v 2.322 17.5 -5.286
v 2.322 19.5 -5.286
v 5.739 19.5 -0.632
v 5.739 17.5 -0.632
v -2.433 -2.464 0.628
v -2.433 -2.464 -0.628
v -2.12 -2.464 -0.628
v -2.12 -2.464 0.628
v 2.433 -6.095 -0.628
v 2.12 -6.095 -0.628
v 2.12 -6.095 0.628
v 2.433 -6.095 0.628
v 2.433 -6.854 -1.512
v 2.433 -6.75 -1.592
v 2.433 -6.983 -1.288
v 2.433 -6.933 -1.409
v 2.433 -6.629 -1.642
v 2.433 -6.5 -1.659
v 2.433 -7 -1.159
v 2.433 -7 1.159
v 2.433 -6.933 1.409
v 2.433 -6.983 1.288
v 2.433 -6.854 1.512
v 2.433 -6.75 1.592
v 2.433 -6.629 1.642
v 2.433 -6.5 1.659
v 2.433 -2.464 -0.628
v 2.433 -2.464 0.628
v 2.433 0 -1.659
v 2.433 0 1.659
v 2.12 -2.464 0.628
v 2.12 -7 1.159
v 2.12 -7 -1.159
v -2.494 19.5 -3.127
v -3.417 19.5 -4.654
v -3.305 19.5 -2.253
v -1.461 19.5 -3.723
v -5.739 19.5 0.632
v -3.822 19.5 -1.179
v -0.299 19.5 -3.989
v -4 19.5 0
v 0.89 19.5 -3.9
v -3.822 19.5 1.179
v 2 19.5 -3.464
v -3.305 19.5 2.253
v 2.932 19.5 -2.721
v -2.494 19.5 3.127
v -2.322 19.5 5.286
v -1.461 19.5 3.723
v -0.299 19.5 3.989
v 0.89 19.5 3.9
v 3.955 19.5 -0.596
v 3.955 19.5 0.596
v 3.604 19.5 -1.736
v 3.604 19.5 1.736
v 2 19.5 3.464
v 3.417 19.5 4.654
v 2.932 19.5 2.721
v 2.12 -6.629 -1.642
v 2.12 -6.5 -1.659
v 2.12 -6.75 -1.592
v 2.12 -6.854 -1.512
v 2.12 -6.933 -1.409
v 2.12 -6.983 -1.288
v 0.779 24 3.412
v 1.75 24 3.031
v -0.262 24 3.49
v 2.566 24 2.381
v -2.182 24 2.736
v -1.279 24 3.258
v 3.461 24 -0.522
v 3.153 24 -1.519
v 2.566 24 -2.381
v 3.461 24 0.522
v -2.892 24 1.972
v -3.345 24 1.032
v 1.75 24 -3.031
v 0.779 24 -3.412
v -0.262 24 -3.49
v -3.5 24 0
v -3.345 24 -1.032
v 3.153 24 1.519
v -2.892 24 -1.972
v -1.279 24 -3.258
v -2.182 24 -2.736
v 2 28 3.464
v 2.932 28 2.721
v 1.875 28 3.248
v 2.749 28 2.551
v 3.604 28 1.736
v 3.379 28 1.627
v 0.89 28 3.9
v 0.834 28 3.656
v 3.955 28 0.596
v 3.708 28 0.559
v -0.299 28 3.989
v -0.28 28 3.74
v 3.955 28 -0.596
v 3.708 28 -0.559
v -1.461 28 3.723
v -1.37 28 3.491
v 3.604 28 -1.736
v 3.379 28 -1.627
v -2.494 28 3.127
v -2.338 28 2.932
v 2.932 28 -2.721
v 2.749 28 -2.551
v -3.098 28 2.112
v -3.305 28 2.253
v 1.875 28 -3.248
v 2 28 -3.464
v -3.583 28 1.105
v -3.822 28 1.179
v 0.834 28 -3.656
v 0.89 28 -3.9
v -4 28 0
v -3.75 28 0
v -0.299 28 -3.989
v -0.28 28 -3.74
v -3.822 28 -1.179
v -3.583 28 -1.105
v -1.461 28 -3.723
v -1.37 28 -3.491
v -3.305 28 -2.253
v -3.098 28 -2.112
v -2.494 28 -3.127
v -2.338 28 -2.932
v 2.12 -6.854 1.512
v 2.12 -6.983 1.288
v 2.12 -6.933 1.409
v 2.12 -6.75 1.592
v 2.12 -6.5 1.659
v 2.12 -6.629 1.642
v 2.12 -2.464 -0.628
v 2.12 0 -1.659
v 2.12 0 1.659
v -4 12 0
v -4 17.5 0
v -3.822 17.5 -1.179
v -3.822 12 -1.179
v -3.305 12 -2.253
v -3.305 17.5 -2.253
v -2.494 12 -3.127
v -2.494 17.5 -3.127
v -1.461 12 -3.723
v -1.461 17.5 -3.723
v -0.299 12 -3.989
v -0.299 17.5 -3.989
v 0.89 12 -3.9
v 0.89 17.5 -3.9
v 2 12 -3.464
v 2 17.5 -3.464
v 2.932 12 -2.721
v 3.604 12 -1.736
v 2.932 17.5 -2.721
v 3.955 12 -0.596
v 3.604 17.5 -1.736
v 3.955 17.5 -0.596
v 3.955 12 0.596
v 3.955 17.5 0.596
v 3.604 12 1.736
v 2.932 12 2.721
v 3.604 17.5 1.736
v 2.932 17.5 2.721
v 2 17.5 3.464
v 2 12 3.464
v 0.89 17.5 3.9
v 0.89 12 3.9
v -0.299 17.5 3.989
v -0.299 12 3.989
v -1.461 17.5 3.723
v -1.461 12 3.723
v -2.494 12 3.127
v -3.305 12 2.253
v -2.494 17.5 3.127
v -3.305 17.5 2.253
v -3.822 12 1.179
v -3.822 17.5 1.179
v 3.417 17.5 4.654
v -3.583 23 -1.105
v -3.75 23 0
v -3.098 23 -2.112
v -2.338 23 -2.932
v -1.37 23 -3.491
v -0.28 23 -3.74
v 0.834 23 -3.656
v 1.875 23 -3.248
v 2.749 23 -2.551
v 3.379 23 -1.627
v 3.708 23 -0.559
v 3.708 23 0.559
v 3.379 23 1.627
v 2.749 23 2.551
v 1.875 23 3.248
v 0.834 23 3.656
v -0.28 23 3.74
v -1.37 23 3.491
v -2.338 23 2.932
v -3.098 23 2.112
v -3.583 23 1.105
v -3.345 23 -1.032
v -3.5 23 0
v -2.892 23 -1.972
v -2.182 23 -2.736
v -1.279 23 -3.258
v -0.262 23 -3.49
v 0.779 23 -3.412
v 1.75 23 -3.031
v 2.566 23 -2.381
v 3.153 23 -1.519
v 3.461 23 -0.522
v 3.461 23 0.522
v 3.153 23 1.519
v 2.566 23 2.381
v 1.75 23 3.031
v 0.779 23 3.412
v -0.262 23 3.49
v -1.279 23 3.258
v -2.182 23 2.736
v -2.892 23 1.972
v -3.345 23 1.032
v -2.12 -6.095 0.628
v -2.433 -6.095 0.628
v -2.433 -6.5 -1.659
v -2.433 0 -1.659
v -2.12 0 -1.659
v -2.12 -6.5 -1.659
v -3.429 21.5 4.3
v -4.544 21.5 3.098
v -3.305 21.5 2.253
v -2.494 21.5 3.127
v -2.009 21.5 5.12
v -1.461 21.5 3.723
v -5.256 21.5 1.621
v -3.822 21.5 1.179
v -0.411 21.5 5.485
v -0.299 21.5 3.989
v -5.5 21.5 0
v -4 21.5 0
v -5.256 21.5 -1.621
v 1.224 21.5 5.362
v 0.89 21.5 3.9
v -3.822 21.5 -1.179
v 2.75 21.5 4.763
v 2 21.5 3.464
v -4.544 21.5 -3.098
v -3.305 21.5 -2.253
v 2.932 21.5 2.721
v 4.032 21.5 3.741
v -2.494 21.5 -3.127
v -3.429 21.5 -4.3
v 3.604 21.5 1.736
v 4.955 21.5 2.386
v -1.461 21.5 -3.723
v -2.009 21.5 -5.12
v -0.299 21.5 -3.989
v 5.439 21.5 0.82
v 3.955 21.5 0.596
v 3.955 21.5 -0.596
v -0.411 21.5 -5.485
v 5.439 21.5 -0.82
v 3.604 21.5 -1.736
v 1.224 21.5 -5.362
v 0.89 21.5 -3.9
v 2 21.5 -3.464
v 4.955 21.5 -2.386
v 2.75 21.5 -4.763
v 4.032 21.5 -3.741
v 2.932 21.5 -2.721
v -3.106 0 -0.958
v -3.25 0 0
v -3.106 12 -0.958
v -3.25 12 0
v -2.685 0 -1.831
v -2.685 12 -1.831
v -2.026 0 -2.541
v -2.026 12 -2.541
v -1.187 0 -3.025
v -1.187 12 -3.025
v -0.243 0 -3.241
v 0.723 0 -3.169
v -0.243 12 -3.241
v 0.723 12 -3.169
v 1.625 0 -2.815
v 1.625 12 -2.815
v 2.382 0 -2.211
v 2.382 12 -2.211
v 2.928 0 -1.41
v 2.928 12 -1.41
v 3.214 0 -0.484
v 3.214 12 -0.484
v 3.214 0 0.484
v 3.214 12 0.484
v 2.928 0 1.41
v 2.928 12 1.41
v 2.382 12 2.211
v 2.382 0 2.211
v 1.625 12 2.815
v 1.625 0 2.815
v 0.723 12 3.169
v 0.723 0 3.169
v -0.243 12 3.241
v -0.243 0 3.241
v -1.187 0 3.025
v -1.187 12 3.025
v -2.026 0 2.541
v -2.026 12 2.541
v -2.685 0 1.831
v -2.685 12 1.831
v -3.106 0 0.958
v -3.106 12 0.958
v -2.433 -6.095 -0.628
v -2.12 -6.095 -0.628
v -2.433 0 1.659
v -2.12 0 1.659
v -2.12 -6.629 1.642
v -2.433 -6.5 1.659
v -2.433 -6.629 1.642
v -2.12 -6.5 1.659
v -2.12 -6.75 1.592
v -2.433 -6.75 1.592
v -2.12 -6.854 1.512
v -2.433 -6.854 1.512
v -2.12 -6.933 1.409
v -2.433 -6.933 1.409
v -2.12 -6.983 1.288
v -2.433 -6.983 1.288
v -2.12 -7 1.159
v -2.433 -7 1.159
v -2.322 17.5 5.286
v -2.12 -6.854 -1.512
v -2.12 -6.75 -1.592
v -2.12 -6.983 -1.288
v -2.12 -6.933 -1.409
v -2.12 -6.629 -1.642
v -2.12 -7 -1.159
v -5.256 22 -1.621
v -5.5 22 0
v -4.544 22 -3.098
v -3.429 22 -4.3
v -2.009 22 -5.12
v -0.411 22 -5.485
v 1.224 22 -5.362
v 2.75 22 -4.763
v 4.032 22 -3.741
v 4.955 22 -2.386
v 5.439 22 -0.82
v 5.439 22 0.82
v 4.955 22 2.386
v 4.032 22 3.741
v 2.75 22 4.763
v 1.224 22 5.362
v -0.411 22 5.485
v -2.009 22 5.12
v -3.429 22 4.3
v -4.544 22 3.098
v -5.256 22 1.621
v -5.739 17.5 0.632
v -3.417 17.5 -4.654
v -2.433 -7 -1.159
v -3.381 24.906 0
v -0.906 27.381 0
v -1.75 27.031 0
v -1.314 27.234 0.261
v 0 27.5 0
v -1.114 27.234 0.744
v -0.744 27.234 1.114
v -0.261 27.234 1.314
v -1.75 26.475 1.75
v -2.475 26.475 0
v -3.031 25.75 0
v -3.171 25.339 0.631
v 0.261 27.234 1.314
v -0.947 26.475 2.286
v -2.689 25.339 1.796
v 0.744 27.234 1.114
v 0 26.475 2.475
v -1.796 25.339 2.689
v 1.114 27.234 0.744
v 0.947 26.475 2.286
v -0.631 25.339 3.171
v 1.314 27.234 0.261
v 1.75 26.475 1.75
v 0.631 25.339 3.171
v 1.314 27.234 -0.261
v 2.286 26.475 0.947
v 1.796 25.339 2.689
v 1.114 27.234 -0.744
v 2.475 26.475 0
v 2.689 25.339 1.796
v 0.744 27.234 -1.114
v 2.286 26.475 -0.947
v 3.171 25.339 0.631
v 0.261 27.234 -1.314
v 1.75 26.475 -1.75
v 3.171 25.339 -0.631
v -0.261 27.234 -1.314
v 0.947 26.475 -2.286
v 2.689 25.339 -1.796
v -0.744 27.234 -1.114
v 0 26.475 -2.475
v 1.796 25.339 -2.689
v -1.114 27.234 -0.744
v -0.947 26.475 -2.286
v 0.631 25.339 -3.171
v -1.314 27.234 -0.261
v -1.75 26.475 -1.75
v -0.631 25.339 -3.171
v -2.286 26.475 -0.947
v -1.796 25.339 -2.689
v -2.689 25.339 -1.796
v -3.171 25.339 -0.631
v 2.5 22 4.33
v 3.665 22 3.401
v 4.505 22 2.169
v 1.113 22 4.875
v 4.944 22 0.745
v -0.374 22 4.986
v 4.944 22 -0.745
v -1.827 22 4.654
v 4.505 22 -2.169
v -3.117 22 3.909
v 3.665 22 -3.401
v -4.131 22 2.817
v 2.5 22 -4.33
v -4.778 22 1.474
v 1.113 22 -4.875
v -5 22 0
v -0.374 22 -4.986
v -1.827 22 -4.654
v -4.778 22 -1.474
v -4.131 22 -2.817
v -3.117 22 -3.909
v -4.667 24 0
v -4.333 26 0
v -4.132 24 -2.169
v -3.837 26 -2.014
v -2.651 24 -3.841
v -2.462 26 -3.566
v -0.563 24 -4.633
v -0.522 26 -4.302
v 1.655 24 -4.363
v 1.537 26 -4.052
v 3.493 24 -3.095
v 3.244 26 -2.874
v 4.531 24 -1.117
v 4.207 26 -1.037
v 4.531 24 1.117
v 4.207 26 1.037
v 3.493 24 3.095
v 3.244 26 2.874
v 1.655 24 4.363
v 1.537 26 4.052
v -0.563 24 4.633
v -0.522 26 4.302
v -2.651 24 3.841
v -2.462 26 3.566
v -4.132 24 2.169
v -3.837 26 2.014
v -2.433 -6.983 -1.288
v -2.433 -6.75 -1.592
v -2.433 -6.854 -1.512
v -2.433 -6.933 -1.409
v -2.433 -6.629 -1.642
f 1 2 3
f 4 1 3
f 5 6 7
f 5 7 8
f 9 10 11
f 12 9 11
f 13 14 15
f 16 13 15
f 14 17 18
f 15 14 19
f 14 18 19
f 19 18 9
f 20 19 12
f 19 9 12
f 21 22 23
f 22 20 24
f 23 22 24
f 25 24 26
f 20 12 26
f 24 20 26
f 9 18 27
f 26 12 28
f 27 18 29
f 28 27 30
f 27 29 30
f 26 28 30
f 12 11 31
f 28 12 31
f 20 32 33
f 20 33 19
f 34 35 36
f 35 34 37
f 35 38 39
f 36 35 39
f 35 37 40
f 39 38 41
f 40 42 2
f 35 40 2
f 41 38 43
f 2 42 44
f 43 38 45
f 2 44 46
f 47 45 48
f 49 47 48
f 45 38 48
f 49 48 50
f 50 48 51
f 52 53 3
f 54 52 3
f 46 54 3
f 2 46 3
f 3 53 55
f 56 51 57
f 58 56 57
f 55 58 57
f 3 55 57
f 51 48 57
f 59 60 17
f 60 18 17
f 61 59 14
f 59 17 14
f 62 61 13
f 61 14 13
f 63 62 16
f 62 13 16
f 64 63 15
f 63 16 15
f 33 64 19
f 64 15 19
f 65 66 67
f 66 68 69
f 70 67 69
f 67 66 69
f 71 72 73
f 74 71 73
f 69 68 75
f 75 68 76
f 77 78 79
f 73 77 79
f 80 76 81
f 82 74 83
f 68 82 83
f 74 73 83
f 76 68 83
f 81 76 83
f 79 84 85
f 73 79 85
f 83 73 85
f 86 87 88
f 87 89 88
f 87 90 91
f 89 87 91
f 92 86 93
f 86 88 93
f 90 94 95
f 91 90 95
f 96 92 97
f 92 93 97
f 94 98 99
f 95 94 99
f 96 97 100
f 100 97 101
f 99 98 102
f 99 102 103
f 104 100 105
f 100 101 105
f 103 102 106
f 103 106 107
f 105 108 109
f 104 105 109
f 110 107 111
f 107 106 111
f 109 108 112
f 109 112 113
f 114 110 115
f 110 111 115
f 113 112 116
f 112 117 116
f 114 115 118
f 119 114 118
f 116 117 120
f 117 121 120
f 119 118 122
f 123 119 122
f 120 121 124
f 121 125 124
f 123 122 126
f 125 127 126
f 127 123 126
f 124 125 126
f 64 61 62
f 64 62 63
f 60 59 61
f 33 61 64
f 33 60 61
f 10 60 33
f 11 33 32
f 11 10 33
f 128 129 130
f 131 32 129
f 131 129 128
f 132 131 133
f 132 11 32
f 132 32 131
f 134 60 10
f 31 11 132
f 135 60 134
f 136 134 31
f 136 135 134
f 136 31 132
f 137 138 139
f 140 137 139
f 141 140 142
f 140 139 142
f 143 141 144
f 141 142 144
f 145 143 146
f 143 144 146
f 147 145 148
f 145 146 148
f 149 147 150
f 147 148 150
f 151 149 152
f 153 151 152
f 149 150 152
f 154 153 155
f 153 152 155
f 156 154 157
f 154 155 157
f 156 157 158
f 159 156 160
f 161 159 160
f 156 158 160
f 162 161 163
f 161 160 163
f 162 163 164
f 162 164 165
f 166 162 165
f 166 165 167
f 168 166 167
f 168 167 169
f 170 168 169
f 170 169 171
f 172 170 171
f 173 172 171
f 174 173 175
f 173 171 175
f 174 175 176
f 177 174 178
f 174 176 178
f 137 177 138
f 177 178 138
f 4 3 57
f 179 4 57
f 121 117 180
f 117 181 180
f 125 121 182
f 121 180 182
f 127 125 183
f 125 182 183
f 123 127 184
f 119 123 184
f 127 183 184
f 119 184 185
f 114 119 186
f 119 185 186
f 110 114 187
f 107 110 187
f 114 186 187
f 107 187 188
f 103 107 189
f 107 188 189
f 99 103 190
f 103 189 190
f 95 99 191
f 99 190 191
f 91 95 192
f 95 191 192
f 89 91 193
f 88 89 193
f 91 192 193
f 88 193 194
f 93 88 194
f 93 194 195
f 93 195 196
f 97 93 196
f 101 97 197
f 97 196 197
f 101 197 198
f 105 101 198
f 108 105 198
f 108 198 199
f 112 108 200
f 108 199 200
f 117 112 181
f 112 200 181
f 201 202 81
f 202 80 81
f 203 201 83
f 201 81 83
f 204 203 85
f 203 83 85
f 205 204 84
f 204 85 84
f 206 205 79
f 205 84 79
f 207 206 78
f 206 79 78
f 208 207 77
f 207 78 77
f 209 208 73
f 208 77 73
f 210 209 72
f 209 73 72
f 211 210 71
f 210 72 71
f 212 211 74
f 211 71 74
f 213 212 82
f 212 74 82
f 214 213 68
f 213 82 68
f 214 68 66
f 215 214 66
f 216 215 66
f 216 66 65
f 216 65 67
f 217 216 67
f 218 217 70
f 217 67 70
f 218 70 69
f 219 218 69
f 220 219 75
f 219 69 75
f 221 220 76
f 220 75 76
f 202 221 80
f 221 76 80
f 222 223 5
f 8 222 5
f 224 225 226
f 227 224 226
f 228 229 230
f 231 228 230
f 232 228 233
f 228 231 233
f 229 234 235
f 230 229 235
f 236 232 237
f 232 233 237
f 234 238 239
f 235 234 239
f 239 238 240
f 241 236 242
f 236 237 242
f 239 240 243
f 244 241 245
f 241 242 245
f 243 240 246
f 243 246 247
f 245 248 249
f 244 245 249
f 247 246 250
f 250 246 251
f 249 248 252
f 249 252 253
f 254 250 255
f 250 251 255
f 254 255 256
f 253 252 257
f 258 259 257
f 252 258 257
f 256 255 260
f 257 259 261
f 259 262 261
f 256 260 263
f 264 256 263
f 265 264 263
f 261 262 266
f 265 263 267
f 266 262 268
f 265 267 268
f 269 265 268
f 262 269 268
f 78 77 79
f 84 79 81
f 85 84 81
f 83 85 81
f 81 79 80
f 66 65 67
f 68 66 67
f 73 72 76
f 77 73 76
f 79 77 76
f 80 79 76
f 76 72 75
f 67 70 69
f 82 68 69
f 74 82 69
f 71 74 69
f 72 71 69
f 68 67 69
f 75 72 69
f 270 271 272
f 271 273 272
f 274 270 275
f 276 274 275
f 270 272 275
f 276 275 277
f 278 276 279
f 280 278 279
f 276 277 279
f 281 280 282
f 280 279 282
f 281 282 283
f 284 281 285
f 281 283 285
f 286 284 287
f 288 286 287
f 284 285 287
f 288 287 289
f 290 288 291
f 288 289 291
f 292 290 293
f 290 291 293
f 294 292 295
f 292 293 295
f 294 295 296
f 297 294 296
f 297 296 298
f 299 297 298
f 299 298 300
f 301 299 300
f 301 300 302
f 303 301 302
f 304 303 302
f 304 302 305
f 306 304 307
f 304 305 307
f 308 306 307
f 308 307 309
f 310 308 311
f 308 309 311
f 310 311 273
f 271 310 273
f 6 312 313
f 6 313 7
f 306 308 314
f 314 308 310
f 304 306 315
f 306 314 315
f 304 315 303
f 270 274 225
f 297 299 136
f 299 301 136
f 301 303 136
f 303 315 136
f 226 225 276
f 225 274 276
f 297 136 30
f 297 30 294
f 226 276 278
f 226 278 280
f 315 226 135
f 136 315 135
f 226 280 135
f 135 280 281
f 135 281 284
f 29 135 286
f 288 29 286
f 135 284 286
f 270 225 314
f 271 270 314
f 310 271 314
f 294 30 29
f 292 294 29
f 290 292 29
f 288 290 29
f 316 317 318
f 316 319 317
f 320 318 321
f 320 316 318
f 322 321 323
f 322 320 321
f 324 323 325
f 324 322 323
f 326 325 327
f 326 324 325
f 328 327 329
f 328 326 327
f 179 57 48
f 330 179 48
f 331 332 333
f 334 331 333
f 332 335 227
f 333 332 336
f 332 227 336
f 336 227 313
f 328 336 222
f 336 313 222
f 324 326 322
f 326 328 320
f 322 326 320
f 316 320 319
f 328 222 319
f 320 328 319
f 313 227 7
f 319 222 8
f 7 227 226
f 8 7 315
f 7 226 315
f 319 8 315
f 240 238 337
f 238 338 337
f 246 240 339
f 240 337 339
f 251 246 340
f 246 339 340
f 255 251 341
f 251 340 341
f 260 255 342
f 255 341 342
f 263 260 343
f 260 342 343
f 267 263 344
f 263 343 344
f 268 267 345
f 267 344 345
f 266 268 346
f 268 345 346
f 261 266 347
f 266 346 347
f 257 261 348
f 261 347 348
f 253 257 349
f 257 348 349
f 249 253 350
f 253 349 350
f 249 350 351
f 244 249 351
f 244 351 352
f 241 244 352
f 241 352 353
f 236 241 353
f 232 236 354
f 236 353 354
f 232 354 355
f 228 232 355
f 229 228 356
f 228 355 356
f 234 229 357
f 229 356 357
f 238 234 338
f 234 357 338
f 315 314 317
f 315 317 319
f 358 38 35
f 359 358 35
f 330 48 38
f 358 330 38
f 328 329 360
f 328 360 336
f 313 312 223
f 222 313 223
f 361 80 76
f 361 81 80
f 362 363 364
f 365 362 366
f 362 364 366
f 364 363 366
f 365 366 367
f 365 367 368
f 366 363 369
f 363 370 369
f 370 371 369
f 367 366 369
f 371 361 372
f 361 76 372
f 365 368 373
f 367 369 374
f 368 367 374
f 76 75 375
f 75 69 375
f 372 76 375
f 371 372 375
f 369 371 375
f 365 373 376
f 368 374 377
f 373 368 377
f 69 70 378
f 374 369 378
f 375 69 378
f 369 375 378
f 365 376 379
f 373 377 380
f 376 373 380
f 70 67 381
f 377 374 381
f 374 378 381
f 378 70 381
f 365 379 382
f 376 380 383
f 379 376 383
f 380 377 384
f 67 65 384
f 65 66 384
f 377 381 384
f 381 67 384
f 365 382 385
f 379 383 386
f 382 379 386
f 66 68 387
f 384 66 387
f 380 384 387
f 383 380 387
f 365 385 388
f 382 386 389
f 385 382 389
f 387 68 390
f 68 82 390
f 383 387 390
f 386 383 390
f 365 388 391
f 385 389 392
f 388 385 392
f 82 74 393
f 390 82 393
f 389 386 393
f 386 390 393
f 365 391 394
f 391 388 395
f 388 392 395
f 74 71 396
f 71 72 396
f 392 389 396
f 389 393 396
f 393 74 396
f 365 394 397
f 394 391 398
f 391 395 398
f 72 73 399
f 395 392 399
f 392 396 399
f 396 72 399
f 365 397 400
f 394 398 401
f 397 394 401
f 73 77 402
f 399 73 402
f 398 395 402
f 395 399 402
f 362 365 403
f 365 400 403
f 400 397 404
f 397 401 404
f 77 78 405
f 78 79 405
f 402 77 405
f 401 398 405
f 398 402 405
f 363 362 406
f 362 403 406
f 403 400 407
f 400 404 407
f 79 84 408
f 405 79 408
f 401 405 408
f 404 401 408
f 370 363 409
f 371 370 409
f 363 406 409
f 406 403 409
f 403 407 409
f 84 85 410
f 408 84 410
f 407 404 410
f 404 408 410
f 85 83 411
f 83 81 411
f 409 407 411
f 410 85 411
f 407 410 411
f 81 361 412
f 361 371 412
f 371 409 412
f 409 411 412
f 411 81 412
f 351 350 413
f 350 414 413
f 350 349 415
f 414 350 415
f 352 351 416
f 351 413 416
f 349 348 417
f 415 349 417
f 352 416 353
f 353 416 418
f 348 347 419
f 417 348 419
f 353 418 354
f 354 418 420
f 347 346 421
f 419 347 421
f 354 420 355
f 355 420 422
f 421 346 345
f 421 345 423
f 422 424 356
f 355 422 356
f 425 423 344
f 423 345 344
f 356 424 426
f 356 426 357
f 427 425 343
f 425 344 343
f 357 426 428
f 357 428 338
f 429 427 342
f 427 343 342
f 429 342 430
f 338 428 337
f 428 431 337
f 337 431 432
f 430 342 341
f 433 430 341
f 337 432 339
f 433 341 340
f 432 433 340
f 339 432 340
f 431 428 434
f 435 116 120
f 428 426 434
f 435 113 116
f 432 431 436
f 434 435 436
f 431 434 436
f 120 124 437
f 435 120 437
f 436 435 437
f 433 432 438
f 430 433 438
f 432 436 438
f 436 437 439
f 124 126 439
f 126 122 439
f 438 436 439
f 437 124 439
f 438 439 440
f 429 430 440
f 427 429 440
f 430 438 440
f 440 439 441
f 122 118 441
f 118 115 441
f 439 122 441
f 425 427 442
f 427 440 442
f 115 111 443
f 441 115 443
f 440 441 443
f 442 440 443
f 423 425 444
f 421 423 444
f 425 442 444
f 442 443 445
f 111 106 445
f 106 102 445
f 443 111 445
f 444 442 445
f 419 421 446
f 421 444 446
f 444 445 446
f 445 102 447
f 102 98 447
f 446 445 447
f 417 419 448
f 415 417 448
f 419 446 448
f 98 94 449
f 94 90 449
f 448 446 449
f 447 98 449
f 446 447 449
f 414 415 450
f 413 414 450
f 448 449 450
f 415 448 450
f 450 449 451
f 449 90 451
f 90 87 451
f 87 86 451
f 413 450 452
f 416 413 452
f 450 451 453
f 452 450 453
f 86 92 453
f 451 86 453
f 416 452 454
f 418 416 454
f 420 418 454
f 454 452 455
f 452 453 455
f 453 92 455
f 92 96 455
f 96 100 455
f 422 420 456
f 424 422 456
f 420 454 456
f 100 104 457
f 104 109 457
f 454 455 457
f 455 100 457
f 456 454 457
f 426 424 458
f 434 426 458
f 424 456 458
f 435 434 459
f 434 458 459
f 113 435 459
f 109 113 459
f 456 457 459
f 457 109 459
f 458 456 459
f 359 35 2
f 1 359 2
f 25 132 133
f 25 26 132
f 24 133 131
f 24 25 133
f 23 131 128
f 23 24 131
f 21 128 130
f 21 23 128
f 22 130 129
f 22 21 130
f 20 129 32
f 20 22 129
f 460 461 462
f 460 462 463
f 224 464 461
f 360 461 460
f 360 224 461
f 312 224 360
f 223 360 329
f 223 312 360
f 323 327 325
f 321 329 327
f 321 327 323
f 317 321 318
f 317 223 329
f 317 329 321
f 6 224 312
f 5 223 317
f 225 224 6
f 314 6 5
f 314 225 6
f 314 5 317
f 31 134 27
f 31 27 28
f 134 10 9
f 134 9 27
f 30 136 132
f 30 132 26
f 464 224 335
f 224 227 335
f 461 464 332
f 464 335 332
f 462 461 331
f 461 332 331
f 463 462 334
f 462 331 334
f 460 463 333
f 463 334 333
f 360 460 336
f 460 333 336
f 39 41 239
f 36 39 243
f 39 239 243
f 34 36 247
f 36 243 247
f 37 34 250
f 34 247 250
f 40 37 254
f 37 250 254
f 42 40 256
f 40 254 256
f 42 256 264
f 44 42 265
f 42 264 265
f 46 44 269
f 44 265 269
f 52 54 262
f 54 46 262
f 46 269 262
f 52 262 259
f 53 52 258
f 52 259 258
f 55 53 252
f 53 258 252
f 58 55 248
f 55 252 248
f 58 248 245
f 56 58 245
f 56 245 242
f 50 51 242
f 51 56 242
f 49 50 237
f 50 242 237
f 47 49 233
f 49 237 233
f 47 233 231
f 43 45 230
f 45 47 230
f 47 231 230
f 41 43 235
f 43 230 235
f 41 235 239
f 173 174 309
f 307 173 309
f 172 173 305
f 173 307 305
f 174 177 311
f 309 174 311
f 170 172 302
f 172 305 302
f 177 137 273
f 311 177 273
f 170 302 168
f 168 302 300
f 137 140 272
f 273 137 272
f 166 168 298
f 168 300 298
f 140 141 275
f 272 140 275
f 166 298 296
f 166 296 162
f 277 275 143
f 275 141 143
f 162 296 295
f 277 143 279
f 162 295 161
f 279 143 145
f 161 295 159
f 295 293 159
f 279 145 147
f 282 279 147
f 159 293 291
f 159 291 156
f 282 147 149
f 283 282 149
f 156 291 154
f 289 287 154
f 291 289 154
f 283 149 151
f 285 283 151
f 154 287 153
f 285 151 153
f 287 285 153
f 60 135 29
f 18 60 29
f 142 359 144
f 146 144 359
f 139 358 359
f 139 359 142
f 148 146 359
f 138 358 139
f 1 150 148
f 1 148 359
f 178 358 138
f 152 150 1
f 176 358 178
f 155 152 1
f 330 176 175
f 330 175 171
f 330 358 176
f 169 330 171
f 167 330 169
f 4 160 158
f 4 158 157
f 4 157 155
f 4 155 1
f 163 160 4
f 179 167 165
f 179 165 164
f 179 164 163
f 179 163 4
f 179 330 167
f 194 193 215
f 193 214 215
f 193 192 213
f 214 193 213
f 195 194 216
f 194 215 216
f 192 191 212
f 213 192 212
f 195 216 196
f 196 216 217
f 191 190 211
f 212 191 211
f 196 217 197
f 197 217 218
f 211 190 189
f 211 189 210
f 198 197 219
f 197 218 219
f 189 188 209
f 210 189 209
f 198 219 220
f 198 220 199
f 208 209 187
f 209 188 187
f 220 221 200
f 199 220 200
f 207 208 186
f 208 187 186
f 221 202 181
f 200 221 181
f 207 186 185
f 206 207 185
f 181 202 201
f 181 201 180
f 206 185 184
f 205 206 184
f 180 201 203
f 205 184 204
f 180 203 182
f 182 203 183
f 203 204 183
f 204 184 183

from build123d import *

# Parameters (mm, degrees)
SKETCH2_W           = 0.313326982
SKETCH2_H           = 3.317579804
BOSS_EXTRUDE1_DEPTH = 7
SKETCH3_W           = 1.255689372
SKETCH3_H           = 3.631317916
CUT_EXTRUDE1_DEPTH  = 8.932891857
FILLET1_R           = 0.5
BOSS_EXTRUDE2_START = 2
BOSS_EXTRUDE2_DEPTH = 2


with BuildPart() as part:
    # Sketch1 → Revolve1 (revolve)
    with BuildSketch(Plane(origin=(0, 0, 0), x_dir=(0, 1, 0), z_dir=(0, 0, 1))):
        Polygon((0, 0), (0, 3.25), (12, 3.25), (12, 4), (21.5, 4), (21.5, 5.5), (22, 5.5), (22, 5), (28, 4), (28, 3.75), (23, 3.75), (23, 3.5), (24, 3.5), (24, 0), align=None)
    revolve(axis=Axis((0, 0, 0), (0, -1, 0)))

    # Sketch2 → Boss-Extrude1 (add)
    with BuildSketch(Plane.XZ):
        with Locations((-2.276228366, 0)):
            Rectangle(SKETCH2_W, SKETCH2_H)
        with Locations((2.276228366, 0)):
            Rectangle(SKETCH2_W, SKETCH2_H)
    extrude(amount=BOSS_EXTRUDE1_DEPTH)

    # Sketch3 → Cut-Extrude1 (cut, through all)
    with BuildSketch(Plane.ZY.offset(2.432891857)):
        with Locations((0, -4.279803291)):
            Rectangle(SKETCH3_W, SKETCH3_H)
    extrude(amount=-CUT_EXTRUDE1_DEPTH, mode=Mode.SUBTRACT)

    # Fillet1
    fillet1_edges = [part.edges().sort_by_distance(p)[0] for p in [
        (-2.276228366, -7, -1.658789902),
        (-2.276228366, -7, 1.658789902),
        (2.276228366, -7, 1.658789902),
        (2.276228366, -7, -1.658789902),
    ]]
    fillet(fillet1_edges, radius=FILLET1_R)

    # Sketch4 → Boss-Extrude2 (add)
    with BuildSketch(Plane.XZ.offset(-21.5).offset(BOSS_EXTRUDE2_START)):
        Polygon((-2.321621061, 5.286152569), (-5.738752943, 0.632493468), (-3.417131883, -4.653659101), (2.321621061, -5.286152569), (5.738752943, -0.632493468), (3.417131883, 4.653659101), align=None)
    extrude(amount=BOSS_EXTRUDE2_DEPTH)


with BuildPart() as body_2:
    # Sketch6 → Green (revolve)
    with BuildSketch(Plane.XY):
        with BuildLine():
            Line((-3.5, 24), (0, 24))
            Line((0, 24), (0, 27.5))
            ThreePointArc((0, 27.5), (-2.474873734, 26.474873734), (-3.5, 24))
        make_face()
    revolve(axis=Axis((0, 24, 0), (0, 1, 0)))


solid = Compound([part.part, body_2.part])
